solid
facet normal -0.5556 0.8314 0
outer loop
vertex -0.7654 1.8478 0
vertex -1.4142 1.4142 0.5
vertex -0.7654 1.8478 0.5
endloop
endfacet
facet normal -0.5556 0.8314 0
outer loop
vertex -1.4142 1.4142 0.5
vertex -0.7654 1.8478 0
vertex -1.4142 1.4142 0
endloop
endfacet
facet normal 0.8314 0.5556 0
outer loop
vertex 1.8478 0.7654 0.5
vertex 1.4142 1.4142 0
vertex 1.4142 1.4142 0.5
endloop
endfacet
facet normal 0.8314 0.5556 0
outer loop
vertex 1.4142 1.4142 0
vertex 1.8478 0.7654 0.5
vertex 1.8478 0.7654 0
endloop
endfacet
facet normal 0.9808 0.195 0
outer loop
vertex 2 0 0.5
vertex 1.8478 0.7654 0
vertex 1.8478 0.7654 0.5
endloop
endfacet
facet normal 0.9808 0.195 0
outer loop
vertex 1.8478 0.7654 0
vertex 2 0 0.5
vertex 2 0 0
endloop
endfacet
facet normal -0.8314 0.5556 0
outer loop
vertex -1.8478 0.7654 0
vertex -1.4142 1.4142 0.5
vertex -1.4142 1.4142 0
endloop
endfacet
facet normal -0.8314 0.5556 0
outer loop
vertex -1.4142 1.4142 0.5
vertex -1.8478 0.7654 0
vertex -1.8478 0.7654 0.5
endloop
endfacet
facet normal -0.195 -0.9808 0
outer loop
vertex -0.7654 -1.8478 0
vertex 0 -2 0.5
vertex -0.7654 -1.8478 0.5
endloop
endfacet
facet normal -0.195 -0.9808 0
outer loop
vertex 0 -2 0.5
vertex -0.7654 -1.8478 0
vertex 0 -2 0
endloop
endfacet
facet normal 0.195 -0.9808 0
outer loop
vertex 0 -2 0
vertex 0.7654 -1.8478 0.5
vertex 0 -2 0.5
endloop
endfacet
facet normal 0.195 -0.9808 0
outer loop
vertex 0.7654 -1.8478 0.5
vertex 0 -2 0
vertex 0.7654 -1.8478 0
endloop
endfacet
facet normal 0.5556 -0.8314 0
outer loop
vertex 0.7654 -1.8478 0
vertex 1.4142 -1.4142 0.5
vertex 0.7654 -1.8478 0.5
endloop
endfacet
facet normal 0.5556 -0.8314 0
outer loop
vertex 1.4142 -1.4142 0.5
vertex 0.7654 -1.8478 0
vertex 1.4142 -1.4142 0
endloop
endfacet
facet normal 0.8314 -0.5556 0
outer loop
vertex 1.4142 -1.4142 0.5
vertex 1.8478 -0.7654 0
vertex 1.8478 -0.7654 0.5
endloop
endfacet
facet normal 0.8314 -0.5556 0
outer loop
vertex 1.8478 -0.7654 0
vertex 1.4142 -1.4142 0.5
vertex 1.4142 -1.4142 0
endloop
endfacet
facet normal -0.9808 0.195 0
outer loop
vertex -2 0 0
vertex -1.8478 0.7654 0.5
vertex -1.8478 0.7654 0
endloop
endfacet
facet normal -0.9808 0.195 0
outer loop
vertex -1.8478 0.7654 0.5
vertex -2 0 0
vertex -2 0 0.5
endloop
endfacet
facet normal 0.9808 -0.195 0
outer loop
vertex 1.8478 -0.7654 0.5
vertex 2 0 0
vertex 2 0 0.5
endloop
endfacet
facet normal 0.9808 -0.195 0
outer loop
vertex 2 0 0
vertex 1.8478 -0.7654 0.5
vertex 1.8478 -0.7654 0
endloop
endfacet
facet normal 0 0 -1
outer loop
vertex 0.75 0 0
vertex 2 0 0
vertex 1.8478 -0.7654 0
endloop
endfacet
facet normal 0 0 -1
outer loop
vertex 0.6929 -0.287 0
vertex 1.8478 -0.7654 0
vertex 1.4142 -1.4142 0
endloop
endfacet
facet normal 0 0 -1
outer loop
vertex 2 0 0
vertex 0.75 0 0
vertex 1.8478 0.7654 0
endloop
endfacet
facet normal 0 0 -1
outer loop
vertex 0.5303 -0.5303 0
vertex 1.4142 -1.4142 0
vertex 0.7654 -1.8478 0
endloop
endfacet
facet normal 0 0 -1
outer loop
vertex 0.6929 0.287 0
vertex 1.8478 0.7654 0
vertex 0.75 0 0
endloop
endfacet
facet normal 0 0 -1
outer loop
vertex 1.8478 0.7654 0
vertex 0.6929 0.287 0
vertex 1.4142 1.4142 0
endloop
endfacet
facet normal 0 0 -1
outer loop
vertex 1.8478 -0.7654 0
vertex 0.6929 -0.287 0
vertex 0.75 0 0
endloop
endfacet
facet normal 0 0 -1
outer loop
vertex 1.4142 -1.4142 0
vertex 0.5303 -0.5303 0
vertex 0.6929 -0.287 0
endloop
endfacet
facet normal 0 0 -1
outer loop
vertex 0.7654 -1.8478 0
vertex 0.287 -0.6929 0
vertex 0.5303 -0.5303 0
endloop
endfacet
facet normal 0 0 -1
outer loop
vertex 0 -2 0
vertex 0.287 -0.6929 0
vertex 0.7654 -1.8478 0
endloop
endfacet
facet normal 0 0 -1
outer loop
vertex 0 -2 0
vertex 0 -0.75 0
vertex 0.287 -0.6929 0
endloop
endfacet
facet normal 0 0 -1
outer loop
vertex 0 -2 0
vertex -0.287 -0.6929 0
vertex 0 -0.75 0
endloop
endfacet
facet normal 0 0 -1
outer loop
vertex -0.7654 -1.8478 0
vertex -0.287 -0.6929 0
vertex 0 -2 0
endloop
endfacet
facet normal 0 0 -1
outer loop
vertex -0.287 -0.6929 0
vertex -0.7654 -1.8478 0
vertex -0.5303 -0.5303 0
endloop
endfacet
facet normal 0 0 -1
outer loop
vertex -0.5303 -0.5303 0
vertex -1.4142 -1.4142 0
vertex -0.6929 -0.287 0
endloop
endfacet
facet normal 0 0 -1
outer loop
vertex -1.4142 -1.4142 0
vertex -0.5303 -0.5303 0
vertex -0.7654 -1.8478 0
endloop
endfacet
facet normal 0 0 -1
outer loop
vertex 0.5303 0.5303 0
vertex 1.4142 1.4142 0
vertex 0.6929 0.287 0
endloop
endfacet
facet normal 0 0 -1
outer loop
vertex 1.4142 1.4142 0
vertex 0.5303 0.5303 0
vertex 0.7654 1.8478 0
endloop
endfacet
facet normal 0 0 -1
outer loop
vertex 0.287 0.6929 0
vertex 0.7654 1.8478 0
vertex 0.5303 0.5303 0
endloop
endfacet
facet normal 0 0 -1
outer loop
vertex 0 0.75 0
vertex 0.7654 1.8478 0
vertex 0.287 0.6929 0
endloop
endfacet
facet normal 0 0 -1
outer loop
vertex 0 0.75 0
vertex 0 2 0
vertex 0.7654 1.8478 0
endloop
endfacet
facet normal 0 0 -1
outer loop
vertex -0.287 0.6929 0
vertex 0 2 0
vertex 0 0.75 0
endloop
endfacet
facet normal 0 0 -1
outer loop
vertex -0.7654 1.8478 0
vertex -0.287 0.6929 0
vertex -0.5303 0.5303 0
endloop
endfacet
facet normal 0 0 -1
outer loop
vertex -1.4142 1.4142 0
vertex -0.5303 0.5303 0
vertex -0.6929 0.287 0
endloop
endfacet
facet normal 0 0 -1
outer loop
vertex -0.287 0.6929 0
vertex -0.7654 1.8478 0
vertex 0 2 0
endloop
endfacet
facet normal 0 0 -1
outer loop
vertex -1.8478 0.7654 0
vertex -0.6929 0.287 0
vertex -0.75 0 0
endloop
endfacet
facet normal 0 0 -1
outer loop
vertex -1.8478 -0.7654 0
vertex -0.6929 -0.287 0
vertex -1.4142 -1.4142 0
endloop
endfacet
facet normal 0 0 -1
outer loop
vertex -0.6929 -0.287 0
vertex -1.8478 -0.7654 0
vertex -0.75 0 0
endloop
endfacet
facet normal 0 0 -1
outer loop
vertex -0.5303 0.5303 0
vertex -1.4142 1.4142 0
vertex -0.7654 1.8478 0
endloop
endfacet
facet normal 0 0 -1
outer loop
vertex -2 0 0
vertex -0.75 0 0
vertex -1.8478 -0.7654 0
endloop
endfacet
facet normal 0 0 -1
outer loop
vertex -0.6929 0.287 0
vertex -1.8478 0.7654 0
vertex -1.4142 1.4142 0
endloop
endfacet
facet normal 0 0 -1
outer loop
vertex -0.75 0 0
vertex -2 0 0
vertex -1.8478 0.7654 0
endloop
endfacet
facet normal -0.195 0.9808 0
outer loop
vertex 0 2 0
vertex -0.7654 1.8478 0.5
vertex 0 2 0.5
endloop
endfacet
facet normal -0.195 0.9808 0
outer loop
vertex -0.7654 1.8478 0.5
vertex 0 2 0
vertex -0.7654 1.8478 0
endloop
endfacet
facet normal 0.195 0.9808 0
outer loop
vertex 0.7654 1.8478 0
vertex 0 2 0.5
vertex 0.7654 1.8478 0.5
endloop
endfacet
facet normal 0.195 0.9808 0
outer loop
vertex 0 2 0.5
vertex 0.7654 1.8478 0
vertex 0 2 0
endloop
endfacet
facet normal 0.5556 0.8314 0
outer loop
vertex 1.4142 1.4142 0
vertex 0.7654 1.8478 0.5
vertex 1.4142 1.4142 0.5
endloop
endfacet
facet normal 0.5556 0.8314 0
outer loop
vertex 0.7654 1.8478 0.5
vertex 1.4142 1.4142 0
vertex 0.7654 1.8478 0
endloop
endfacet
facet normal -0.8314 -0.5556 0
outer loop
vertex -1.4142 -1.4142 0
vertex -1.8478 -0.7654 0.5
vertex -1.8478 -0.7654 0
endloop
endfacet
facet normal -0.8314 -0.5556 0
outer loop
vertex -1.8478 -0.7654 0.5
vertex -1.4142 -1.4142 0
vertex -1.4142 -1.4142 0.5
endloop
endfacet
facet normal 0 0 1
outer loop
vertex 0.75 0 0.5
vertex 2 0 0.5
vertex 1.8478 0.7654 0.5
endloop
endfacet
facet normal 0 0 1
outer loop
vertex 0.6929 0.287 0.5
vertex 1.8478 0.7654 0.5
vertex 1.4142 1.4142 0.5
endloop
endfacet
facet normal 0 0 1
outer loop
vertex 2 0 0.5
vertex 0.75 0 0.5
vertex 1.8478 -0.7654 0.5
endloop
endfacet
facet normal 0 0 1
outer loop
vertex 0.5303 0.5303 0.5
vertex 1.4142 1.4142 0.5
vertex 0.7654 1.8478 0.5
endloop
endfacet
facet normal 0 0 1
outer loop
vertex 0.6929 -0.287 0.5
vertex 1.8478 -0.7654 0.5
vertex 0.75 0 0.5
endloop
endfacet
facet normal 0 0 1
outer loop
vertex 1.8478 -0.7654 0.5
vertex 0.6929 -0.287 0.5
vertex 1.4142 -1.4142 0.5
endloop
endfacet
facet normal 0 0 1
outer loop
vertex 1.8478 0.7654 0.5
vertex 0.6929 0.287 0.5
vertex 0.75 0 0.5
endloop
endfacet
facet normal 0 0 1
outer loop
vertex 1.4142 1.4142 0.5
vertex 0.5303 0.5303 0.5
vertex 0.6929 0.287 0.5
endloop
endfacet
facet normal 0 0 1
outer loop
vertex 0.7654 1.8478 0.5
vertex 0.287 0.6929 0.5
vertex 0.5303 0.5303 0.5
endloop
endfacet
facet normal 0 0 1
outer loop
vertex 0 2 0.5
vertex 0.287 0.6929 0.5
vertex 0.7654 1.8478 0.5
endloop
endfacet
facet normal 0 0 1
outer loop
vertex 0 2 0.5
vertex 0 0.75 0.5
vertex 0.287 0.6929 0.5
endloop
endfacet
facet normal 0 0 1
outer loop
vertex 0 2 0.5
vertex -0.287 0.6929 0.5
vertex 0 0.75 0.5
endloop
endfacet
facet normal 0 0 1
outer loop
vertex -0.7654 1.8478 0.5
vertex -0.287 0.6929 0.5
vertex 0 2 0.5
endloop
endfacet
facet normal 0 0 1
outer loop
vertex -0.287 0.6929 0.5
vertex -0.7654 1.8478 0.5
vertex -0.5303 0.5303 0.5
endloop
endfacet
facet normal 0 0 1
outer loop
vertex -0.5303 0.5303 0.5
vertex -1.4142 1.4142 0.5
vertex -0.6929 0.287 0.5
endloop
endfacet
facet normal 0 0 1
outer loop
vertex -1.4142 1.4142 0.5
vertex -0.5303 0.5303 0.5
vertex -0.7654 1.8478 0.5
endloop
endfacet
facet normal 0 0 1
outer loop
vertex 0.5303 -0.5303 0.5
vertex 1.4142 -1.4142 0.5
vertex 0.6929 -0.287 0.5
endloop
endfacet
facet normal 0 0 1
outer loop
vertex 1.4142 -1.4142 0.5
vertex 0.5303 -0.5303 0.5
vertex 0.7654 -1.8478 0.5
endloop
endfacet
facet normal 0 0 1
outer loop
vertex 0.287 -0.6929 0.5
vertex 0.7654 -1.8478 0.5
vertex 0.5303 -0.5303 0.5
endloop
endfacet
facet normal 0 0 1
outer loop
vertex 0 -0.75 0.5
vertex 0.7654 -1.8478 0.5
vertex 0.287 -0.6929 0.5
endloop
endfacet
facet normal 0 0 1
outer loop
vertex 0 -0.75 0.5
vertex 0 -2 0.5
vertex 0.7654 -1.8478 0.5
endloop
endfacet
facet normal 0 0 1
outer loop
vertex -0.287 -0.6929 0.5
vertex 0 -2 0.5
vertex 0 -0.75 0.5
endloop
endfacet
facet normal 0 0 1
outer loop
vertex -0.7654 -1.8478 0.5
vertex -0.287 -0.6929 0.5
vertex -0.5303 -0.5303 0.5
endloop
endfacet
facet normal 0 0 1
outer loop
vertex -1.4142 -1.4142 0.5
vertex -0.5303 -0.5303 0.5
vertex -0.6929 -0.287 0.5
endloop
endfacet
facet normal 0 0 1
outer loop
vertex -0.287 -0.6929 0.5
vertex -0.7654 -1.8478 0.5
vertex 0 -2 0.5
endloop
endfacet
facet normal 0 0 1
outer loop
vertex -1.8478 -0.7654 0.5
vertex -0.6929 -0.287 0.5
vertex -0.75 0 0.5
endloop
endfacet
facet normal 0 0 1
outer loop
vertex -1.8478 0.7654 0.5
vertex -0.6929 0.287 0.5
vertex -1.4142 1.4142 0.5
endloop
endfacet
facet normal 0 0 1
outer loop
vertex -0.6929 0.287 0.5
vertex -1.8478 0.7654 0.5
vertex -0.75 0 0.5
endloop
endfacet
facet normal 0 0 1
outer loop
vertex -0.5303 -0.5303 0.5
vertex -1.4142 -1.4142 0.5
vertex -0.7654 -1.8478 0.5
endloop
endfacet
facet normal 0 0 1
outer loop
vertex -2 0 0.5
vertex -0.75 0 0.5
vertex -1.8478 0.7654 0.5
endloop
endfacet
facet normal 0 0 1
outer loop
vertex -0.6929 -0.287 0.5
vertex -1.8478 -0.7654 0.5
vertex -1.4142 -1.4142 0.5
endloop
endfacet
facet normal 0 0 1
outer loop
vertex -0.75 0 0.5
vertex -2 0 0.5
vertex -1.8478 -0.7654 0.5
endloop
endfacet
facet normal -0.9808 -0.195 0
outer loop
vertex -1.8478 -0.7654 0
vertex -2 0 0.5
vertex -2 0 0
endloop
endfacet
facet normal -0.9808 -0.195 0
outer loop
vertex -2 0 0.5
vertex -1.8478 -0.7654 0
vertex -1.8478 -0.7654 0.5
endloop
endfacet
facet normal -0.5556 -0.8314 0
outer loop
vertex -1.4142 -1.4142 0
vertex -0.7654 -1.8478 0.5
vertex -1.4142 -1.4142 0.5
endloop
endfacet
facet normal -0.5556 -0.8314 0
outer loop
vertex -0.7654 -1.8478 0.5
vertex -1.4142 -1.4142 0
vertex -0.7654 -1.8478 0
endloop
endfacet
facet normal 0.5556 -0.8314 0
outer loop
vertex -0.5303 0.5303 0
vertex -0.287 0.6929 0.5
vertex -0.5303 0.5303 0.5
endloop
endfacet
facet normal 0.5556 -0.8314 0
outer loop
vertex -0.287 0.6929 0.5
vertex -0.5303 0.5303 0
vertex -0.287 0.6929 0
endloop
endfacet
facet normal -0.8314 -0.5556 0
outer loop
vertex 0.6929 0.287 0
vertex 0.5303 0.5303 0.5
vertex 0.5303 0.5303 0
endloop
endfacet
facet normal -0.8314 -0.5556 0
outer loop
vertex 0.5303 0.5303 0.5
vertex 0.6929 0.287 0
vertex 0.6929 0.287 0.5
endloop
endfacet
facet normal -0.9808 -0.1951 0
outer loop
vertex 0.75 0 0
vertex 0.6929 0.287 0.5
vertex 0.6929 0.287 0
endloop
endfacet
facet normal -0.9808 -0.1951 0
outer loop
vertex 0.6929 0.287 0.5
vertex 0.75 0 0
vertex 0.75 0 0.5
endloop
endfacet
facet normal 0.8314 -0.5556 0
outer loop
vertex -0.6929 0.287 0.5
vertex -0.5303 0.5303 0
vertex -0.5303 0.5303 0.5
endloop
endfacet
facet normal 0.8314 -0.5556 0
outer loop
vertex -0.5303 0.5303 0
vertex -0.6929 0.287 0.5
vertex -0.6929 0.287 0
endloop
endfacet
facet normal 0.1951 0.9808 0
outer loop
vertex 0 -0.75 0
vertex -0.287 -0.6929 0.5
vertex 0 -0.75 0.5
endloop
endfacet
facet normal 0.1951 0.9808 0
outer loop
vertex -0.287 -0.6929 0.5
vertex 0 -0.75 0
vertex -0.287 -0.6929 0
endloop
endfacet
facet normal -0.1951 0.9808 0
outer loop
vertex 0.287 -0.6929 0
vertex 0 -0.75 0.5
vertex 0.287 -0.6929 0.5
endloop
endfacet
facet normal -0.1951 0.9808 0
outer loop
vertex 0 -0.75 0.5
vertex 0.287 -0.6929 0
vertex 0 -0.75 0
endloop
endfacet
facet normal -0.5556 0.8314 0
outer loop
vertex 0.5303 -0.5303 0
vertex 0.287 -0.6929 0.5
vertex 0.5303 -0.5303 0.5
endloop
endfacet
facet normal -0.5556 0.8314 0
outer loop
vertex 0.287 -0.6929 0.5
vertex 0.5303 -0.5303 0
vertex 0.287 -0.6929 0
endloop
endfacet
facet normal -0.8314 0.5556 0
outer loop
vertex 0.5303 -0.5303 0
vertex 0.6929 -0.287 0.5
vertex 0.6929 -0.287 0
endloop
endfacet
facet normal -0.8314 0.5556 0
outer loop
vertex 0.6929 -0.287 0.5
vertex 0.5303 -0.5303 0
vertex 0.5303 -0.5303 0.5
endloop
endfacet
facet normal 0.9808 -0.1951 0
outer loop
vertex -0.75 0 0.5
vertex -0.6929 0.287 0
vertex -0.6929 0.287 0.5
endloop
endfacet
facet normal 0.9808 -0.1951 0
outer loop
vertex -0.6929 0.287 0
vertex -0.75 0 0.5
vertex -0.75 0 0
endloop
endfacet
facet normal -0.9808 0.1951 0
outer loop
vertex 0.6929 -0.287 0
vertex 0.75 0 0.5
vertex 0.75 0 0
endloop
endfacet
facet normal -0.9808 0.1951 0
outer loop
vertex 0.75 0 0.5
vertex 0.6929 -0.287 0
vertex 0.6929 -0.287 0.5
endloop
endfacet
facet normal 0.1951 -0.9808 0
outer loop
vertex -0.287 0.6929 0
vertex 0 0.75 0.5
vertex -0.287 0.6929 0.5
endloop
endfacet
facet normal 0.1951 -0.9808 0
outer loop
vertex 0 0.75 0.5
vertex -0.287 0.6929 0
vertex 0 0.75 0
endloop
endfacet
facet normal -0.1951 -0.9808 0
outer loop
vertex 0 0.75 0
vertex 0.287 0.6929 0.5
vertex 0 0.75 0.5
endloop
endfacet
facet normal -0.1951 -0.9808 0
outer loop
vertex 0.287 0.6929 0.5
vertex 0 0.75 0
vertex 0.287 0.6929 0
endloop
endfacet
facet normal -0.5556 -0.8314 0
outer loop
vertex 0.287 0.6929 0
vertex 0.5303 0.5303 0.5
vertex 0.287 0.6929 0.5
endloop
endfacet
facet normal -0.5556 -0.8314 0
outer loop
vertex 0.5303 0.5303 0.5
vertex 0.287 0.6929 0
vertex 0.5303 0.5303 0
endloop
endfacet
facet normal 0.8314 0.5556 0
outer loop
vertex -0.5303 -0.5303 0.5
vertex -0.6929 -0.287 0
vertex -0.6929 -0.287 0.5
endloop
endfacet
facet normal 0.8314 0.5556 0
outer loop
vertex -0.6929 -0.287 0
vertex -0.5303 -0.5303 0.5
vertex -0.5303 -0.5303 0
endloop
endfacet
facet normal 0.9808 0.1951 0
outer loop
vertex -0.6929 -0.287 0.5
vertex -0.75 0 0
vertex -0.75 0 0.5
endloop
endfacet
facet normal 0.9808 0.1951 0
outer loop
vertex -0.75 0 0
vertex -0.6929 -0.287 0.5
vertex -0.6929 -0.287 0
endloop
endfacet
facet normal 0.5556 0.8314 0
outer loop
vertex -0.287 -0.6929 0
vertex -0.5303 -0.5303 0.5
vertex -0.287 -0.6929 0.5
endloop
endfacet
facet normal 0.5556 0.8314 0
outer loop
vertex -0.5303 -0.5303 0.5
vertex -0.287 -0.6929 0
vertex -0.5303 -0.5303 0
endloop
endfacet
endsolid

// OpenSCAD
// ==========================================
// Xentient Interior — Reference Markers
// Small printed markers glued at mounting coordinates
// Help locate drill/glue positions inside the shell
// ==========================================
// Print count: 10 (3 Zone A + 4 Zone B + 3 Zone C)
// Glue positions: see SPEC-v3.md §5
// Adhesive: small dab of cyanoacrylate
// Per Framework §7: 0.5mm deep reference dimples
// Units: mm

$fn = 16;

Mark_Dia   = 4.0;      // Marker disc diameter (visible, easy to place)
Mark_T     = 0.5;      // Marker thickness
Pilot_D    = 1.5;      // Center pilot (marks exact coordinate)

module reference_marker() {
    difference() {
        cylinder(h=Mark_T, d=Mark_Dia, $fn=16);
        translate([0, 0, -0.1])
            cylinder(h=Mark_T + 0.2, d=Pilot_D, $fn=16);
    }
}

// Render single marker (print 10: 3+4+3)
reference_marker();
